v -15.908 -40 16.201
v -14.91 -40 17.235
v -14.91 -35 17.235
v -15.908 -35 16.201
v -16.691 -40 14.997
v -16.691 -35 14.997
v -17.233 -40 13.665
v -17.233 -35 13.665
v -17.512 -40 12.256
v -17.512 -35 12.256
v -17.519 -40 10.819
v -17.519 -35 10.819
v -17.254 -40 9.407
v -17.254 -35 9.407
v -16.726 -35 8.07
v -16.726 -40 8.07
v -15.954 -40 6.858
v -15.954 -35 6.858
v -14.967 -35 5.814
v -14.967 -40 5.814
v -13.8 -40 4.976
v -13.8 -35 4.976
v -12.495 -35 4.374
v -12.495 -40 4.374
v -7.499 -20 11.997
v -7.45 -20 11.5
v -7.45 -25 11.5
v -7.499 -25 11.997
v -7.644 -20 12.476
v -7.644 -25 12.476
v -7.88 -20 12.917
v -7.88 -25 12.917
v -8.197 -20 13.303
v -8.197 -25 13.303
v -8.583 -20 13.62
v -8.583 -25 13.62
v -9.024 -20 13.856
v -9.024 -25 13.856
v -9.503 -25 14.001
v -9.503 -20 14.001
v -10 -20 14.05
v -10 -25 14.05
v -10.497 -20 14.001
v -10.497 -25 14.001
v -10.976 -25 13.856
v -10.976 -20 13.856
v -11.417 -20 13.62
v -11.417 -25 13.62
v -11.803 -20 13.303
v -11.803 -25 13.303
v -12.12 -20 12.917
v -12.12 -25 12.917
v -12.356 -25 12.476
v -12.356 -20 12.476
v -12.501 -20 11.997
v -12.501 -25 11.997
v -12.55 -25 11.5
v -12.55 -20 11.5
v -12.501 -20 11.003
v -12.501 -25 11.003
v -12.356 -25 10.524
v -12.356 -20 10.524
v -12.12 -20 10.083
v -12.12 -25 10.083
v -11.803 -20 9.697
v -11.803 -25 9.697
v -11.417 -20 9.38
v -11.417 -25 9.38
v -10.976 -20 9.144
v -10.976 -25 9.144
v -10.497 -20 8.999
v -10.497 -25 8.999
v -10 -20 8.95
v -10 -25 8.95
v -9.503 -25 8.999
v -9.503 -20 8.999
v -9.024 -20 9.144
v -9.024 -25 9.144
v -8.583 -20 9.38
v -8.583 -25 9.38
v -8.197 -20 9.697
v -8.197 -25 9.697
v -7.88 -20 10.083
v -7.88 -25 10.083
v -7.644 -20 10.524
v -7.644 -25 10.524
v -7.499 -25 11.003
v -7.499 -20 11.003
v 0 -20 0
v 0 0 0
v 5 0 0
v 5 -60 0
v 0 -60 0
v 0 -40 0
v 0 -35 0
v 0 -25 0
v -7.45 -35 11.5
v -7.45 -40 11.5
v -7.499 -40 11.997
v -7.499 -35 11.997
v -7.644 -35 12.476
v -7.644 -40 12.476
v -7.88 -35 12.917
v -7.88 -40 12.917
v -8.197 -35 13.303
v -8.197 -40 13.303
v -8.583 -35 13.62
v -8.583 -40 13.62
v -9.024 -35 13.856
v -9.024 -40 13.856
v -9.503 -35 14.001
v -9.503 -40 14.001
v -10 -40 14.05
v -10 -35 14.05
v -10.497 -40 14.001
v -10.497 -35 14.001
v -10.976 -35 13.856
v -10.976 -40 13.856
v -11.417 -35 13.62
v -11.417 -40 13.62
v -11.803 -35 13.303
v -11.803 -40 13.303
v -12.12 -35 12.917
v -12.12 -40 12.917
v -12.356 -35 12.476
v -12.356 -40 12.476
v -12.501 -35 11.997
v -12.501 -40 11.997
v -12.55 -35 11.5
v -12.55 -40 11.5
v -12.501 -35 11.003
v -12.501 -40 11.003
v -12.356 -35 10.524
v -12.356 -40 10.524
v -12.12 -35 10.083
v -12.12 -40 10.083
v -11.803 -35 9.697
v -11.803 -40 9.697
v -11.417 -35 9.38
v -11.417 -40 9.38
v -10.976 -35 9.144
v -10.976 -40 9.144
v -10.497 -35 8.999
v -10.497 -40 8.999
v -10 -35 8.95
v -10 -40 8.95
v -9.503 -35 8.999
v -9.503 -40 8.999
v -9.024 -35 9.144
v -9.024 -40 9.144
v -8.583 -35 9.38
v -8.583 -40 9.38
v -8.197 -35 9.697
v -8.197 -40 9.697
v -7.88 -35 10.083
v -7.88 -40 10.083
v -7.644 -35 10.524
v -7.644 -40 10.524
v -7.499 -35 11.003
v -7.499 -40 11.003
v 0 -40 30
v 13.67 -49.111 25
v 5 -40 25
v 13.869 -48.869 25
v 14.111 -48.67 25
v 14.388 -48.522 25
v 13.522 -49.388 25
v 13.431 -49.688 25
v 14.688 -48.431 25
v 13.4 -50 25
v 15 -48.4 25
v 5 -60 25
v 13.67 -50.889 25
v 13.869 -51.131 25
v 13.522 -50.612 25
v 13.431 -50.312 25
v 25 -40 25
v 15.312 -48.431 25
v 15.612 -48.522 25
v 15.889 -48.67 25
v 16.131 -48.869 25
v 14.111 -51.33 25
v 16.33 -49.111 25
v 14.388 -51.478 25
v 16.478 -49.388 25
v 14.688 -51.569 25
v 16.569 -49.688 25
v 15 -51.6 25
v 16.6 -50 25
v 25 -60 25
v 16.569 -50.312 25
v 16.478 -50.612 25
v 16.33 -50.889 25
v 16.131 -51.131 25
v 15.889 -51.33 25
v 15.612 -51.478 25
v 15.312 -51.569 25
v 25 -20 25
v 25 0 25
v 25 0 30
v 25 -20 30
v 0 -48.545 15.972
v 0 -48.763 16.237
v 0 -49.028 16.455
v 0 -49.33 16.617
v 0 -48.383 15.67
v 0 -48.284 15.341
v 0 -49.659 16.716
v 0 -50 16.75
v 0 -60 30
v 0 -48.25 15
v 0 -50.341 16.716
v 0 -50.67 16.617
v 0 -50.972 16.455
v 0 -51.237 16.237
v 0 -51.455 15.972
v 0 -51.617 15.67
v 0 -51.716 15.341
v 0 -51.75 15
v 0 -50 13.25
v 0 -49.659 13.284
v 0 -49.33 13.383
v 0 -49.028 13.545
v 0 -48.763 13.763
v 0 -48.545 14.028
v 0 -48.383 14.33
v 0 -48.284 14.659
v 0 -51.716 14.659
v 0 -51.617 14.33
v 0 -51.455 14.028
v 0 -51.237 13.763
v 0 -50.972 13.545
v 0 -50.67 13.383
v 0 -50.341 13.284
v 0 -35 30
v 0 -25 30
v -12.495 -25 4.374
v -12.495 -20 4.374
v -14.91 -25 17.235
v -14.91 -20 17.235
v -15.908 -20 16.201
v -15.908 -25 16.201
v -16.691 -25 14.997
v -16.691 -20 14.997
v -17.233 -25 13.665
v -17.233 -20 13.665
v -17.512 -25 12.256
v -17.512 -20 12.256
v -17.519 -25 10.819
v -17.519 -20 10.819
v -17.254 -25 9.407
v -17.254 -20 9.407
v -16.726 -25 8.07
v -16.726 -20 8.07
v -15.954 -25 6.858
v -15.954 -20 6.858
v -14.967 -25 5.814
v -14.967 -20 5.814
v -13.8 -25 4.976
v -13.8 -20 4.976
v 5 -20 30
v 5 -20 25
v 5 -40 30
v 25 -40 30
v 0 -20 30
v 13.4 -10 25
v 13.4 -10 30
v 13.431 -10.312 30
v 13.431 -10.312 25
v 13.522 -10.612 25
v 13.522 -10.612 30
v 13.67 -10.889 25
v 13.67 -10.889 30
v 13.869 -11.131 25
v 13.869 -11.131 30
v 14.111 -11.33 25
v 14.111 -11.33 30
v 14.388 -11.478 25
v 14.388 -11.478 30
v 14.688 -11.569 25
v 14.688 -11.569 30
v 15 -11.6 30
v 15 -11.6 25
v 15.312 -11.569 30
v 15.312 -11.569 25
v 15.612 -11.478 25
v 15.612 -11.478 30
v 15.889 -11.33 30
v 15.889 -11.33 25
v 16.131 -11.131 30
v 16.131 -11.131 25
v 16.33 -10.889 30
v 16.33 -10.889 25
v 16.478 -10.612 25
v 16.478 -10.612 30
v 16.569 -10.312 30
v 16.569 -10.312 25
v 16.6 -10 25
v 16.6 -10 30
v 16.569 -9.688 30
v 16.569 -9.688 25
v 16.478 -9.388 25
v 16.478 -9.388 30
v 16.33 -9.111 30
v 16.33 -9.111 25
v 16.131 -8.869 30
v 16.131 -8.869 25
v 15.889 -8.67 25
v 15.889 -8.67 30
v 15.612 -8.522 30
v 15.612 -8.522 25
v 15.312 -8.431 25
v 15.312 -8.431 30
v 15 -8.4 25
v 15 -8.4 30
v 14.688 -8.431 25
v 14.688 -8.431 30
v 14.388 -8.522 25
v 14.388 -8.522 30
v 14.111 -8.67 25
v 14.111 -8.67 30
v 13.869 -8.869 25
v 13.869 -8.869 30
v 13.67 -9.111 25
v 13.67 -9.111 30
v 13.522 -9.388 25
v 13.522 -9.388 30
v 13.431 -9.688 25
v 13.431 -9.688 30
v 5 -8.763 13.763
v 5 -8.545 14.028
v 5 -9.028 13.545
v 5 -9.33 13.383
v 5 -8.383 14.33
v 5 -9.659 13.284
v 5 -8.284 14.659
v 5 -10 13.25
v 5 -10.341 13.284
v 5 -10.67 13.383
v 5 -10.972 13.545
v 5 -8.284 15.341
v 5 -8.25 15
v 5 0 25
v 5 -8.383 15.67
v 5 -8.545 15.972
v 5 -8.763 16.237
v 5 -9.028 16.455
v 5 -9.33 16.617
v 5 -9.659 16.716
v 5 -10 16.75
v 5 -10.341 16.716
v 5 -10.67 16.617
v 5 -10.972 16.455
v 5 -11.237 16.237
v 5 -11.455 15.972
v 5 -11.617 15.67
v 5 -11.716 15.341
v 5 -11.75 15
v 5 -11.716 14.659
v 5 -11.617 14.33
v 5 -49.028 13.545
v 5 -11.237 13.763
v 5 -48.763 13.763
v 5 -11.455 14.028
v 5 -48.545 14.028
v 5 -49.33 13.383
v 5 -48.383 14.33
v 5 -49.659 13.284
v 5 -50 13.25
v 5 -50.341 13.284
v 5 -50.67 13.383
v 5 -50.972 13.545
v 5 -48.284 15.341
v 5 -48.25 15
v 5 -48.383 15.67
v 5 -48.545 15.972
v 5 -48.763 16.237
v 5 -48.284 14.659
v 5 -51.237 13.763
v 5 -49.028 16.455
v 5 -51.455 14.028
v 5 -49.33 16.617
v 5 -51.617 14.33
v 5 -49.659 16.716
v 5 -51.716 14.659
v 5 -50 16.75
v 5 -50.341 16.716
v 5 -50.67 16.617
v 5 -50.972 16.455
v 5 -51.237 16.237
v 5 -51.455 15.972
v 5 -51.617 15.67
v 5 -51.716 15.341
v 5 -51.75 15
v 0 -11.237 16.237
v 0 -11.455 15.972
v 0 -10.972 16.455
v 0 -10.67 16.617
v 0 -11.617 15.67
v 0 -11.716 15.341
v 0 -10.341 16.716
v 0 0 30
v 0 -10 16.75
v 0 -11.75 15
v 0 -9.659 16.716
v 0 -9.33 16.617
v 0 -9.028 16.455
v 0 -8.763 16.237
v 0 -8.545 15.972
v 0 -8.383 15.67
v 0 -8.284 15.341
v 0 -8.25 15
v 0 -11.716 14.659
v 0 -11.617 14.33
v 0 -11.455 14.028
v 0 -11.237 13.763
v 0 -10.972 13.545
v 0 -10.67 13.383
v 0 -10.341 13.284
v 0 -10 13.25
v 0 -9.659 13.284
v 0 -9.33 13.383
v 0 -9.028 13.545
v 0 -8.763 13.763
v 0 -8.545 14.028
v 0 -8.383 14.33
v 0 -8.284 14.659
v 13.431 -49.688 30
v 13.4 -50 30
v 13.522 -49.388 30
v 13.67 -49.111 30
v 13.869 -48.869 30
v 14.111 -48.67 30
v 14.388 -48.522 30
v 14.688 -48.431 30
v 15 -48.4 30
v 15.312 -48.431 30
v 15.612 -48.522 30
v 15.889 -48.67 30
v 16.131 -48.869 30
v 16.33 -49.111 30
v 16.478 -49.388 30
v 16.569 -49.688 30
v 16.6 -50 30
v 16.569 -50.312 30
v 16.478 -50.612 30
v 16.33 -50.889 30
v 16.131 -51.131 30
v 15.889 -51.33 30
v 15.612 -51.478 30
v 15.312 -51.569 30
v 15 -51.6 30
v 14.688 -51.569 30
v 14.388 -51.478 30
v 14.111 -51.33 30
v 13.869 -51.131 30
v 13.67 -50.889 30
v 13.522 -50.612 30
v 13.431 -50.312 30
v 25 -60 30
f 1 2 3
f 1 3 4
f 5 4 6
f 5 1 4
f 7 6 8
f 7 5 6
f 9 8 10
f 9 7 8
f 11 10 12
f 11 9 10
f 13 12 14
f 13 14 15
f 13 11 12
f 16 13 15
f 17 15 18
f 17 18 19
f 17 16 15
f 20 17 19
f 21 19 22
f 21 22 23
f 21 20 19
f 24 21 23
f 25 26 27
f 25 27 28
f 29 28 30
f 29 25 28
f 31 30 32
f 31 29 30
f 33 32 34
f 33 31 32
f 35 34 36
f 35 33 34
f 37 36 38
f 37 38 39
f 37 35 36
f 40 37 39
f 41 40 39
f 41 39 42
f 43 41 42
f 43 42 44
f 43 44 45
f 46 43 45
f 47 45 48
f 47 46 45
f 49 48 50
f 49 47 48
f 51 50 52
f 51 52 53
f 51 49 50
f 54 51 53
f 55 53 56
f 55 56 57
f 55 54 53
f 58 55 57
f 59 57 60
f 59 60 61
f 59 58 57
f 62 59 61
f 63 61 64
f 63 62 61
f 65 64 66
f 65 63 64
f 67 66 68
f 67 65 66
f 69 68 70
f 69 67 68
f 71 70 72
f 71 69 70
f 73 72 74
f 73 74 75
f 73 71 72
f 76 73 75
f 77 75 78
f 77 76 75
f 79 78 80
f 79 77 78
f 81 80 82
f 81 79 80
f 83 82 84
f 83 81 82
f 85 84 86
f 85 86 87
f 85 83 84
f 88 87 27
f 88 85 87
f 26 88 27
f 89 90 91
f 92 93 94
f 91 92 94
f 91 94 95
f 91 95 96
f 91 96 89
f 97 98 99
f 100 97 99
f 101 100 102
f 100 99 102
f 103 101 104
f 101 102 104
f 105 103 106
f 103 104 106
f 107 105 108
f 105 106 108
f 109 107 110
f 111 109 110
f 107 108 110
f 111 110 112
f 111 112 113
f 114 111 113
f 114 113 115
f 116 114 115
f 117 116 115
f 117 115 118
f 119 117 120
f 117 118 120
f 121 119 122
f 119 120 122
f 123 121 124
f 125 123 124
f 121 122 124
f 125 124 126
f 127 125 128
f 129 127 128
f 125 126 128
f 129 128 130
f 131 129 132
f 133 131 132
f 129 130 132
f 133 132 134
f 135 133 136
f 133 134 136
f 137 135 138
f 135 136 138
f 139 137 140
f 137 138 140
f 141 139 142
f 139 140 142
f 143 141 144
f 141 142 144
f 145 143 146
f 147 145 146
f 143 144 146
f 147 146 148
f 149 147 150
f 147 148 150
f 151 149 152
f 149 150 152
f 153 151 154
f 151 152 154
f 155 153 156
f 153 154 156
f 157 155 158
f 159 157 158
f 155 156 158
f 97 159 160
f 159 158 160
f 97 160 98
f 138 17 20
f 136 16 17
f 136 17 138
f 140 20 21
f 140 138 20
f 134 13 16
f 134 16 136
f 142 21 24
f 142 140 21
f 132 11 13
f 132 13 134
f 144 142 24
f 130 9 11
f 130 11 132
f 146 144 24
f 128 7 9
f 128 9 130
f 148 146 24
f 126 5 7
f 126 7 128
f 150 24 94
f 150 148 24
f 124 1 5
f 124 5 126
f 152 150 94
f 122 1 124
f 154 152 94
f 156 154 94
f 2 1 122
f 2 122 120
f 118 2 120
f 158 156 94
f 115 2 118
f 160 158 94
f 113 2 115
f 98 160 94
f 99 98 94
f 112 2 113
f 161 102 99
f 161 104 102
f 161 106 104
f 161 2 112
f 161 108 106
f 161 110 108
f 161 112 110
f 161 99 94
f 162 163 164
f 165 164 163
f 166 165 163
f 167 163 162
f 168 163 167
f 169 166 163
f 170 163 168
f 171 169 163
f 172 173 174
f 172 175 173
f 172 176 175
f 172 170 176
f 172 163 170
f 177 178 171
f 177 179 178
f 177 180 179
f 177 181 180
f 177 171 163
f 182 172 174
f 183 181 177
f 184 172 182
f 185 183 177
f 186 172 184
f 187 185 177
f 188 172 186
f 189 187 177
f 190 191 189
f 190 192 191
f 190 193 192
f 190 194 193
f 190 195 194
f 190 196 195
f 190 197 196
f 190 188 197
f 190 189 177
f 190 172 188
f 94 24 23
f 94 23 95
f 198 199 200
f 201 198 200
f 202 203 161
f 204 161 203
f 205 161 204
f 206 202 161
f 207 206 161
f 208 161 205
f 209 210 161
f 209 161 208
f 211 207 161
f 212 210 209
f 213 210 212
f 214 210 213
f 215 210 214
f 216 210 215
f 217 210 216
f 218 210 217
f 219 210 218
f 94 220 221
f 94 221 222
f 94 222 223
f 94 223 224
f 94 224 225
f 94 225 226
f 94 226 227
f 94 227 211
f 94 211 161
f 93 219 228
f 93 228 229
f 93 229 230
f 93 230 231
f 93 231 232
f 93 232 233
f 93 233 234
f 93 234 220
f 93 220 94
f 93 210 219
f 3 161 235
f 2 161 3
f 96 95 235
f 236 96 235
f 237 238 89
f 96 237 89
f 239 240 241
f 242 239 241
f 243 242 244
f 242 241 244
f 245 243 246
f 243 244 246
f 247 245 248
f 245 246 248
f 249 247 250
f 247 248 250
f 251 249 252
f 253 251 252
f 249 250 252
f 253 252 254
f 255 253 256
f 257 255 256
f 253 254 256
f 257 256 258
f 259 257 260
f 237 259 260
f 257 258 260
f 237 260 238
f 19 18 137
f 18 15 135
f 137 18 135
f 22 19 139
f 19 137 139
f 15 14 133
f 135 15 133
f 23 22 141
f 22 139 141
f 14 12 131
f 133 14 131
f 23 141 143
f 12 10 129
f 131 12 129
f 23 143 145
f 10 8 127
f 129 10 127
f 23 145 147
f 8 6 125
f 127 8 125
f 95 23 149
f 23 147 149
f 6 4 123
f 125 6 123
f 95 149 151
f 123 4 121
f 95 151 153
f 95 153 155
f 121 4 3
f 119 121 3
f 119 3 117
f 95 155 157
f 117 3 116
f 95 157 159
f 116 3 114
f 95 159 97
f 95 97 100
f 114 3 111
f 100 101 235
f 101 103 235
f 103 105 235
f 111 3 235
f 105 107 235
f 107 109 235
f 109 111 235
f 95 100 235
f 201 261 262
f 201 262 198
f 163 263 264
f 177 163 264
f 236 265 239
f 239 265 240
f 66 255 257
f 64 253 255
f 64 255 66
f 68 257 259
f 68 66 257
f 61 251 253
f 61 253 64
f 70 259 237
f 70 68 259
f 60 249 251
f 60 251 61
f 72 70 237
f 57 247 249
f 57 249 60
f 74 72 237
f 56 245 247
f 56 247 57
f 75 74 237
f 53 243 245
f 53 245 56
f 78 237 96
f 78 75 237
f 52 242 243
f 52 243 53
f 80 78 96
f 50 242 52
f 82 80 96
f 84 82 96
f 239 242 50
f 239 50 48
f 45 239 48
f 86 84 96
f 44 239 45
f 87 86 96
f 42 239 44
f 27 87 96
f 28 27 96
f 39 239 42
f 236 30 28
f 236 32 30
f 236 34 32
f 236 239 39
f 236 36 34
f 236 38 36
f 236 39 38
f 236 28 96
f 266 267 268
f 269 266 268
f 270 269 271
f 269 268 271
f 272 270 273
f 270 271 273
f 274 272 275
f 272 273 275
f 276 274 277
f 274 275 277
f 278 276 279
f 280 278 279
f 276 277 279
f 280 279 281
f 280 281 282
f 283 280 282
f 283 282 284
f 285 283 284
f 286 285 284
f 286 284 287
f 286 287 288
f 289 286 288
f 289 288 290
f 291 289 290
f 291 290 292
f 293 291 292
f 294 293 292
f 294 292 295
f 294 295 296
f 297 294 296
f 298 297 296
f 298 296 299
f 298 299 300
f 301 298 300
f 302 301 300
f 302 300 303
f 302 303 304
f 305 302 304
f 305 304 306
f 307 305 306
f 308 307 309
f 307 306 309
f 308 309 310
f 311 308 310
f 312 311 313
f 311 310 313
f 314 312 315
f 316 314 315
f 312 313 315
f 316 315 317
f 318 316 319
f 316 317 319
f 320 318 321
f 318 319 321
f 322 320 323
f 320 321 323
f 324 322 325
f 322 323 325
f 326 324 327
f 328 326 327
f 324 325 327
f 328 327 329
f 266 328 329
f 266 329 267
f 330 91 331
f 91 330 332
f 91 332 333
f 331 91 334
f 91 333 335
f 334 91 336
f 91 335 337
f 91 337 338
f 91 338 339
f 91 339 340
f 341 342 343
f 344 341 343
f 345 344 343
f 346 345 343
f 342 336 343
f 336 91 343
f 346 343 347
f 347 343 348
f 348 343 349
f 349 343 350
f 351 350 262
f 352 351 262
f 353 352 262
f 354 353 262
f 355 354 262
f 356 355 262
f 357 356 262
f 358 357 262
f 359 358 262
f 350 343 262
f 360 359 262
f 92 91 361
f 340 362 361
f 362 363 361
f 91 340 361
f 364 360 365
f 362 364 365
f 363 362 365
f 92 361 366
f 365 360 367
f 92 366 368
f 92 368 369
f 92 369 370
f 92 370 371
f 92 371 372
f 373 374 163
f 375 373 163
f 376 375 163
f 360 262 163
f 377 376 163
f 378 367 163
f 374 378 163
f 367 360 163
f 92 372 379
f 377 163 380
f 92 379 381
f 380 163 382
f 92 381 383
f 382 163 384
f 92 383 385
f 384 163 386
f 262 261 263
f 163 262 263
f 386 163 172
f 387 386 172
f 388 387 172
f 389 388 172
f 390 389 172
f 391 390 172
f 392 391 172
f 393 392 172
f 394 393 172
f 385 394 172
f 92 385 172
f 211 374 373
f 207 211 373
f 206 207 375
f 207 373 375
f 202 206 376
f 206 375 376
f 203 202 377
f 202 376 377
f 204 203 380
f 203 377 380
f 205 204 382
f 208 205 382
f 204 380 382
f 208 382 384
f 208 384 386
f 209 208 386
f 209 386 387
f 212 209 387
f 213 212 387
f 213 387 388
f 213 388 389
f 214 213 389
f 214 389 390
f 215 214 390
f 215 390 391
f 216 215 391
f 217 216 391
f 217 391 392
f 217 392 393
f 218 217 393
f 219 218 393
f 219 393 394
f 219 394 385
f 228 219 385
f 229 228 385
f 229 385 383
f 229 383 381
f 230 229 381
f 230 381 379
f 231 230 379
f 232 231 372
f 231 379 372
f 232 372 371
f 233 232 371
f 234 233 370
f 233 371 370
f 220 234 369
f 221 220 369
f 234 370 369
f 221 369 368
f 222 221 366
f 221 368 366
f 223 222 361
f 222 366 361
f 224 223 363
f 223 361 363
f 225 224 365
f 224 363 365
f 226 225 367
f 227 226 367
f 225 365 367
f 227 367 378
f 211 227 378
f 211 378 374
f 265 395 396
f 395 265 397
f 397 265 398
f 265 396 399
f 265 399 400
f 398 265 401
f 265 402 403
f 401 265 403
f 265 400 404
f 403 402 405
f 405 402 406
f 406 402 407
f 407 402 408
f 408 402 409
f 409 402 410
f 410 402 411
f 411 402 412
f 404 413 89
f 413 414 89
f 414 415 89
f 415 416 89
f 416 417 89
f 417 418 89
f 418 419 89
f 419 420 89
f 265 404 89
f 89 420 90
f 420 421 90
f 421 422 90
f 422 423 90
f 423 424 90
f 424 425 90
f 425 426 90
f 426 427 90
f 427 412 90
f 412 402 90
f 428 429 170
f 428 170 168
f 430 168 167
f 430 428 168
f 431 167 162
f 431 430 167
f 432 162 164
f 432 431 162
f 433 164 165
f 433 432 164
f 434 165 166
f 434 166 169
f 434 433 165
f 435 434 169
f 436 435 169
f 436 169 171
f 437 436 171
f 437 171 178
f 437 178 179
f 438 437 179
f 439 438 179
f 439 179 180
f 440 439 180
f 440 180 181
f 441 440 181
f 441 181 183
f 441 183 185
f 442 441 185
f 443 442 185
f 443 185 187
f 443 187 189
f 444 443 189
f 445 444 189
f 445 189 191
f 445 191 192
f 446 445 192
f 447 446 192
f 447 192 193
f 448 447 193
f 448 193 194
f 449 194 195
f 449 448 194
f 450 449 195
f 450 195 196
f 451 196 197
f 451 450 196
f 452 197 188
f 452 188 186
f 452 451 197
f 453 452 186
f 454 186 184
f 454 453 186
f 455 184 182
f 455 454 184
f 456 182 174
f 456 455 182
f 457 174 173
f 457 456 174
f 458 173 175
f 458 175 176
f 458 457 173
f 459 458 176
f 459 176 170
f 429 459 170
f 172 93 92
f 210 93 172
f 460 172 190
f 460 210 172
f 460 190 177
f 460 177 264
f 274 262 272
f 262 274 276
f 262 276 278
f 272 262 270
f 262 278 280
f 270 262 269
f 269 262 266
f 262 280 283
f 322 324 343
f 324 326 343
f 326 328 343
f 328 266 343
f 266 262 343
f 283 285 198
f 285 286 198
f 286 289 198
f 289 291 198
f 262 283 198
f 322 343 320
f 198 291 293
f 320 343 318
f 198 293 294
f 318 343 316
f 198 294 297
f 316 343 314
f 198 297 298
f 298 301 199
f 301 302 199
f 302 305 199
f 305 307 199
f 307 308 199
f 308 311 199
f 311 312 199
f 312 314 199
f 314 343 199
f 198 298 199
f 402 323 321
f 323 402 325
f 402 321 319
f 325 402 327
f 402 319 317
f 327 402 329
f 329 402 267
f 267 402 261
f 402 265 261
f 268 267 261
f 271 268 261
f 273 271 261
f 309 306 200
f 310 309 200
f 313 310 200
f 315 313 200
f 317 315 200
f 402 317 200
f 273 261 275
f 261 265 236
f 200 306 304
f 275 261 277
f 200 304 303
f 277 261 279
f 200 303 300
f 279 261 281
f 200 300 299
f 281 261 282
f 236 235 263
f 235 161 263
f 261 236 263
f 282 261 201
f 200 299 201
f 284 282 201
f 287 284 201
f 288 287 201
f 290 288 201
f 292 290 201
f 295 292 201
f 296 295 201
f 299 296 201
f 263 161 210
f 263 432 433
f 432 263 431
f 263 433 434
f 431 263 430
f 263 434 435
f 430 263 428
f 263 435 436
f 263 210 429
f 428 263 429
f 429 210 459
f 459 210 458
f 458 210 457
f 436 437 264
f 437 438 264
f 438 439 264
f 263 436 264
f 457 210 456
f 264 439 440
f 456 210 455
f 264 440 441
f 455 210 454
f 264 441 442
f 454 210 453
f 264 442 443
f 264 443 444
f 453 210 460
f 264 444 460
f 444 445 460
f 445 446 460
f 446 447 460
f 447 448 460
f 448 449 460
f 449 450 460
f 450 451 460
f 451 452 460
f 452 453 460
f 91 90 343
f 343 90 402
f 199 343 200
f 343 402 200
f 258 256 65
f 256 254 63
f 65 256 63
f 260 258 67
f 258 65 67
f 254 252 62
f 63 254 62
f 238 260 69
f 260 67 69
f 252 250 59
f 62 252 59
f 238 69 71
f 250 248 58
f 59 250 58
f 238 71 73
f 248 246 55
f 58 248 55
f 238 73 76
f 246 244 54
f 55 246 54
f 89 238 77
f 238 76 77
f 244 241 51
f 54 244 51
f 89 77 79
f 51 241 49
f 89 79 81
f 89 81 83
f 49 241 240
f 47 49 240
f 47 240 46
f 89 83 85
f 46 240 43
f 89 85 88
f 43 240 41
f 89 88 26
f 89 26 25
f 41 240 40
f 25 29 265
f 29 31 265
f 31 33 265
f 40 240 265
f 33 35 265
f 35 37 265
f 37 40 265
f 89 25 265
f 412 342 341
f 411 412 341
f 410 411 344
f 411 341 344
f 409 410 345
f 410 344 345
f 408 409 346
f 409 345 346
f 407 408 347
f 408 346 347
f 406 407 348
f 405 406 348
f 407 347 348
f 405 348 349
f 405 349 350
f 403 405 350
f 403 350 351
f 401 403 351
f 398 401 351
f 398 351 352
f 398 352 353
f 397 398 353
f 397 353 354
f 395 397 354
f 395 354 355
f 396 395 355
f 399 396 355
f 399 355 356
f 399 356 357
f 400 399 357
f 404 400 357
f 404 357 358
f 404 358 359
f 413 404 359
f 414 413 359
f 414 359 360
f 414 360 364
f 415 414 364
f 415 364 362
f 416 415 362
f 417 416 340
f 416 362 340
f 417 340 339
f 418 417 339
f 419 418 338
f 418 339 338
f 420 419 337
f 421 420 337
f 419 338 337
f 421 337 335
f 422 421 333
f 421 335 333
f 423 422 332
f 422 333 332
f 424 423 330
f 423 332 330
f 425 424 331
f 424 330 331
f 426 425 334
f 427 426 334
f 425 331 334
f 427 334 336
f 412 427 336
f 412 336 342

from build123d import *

# Parameters (mm, degrees)
F1_DEPTH  = 20
F4_D      = 3.2
F5_R      = 2.55
F6_DEPTH  = 5
F7_W      = 5
F7_H      = 30
F8_DEPTH  = 5
F10_W     = 20
F10_H     = 20
F10_H_2   = 40
F11_DEPTH = 5
F13_D     = 3.5
F13_DEPTH = 10


with BuildPart() as f1:
    # F0 (on Front) → F1 (new body)
    with BuildSketch(Plane.XZ):
        Polygon((0, 0), (25, 0), (25, 5), (5, 5), (5, 25), (25, 25), (25, 30), (0, 30), align=None)
    extrude(amount=F1_DEPTH)

    # F4 (through all)
    with Locations(Plane(origin=(0, 0, 25), x_dir=(1, 0, 0), z_dir=(0, 0, -1))):
        with Locations((15, 10), (15, -10)):
            Hole(F4_D / 2)

    # F5 (on face) → F6 (join)
    with BuildSketch(Plane.XZ.offset(20)):
        Polygon((5, 30), (0, 30), (0, 0), (5, 0), (5, 5), (5, 25), align=None)
        with BuildLine():
            Line((0, 0), (0, 30))
            Line((0, 30), (-14.910067, 17.235307))
            ThreePointArc((-14.910067, 17.235307), (-17.42027, 10.106411), (-12.494612, 4.374033))
            Line((-12.494612, 4.374033), (0, 0))
        make_face()
        with Locations((-10, 11.5)):
            Circle(F5_R, mode=Mode.SUBTRACT)
    extrude(amount=F6_DEPTH)

    # F7 (on face) → F8 (join)
    with BuildSketch(Plane.XZ.offset(25)):
        with Locations((2.5, 15)):
            Rectangle(F7_W, F7_H)
    extrude(amount=F8_DEPTH)

    # F9: F1 across face


with BuildPart() as f1_1:
    add(f1.part)
    add(f1.part.mirror(Plane(origin=(2.5, -30, 15), x_dir=(1, 0, 0), z_dir=(0, -1, 0))))

    # F10 (on face) → F11 (cut, through all)
    with BuildSketch(Plane.XY.offset(5)):
        with Locations((15, -10)):
            Rectangle(F10_W, F10_H)
        with Locations((15, -40)):
            Rectangle(F10_W, F10_H_2)
    extrude(amount=-F11_DEPTH, mode=Mode.SUBTRACT)

    # F13
    with Locations(Plane(origin=(0, 0, 0), x_dir=(0, -1, 0), z_dir=(-1, 0, 0))):
        with Locations((10, 15), (50, 15)):
            Hole(F13_D / 2, depth=F13_DEPTH)


solid = f1_1.part
